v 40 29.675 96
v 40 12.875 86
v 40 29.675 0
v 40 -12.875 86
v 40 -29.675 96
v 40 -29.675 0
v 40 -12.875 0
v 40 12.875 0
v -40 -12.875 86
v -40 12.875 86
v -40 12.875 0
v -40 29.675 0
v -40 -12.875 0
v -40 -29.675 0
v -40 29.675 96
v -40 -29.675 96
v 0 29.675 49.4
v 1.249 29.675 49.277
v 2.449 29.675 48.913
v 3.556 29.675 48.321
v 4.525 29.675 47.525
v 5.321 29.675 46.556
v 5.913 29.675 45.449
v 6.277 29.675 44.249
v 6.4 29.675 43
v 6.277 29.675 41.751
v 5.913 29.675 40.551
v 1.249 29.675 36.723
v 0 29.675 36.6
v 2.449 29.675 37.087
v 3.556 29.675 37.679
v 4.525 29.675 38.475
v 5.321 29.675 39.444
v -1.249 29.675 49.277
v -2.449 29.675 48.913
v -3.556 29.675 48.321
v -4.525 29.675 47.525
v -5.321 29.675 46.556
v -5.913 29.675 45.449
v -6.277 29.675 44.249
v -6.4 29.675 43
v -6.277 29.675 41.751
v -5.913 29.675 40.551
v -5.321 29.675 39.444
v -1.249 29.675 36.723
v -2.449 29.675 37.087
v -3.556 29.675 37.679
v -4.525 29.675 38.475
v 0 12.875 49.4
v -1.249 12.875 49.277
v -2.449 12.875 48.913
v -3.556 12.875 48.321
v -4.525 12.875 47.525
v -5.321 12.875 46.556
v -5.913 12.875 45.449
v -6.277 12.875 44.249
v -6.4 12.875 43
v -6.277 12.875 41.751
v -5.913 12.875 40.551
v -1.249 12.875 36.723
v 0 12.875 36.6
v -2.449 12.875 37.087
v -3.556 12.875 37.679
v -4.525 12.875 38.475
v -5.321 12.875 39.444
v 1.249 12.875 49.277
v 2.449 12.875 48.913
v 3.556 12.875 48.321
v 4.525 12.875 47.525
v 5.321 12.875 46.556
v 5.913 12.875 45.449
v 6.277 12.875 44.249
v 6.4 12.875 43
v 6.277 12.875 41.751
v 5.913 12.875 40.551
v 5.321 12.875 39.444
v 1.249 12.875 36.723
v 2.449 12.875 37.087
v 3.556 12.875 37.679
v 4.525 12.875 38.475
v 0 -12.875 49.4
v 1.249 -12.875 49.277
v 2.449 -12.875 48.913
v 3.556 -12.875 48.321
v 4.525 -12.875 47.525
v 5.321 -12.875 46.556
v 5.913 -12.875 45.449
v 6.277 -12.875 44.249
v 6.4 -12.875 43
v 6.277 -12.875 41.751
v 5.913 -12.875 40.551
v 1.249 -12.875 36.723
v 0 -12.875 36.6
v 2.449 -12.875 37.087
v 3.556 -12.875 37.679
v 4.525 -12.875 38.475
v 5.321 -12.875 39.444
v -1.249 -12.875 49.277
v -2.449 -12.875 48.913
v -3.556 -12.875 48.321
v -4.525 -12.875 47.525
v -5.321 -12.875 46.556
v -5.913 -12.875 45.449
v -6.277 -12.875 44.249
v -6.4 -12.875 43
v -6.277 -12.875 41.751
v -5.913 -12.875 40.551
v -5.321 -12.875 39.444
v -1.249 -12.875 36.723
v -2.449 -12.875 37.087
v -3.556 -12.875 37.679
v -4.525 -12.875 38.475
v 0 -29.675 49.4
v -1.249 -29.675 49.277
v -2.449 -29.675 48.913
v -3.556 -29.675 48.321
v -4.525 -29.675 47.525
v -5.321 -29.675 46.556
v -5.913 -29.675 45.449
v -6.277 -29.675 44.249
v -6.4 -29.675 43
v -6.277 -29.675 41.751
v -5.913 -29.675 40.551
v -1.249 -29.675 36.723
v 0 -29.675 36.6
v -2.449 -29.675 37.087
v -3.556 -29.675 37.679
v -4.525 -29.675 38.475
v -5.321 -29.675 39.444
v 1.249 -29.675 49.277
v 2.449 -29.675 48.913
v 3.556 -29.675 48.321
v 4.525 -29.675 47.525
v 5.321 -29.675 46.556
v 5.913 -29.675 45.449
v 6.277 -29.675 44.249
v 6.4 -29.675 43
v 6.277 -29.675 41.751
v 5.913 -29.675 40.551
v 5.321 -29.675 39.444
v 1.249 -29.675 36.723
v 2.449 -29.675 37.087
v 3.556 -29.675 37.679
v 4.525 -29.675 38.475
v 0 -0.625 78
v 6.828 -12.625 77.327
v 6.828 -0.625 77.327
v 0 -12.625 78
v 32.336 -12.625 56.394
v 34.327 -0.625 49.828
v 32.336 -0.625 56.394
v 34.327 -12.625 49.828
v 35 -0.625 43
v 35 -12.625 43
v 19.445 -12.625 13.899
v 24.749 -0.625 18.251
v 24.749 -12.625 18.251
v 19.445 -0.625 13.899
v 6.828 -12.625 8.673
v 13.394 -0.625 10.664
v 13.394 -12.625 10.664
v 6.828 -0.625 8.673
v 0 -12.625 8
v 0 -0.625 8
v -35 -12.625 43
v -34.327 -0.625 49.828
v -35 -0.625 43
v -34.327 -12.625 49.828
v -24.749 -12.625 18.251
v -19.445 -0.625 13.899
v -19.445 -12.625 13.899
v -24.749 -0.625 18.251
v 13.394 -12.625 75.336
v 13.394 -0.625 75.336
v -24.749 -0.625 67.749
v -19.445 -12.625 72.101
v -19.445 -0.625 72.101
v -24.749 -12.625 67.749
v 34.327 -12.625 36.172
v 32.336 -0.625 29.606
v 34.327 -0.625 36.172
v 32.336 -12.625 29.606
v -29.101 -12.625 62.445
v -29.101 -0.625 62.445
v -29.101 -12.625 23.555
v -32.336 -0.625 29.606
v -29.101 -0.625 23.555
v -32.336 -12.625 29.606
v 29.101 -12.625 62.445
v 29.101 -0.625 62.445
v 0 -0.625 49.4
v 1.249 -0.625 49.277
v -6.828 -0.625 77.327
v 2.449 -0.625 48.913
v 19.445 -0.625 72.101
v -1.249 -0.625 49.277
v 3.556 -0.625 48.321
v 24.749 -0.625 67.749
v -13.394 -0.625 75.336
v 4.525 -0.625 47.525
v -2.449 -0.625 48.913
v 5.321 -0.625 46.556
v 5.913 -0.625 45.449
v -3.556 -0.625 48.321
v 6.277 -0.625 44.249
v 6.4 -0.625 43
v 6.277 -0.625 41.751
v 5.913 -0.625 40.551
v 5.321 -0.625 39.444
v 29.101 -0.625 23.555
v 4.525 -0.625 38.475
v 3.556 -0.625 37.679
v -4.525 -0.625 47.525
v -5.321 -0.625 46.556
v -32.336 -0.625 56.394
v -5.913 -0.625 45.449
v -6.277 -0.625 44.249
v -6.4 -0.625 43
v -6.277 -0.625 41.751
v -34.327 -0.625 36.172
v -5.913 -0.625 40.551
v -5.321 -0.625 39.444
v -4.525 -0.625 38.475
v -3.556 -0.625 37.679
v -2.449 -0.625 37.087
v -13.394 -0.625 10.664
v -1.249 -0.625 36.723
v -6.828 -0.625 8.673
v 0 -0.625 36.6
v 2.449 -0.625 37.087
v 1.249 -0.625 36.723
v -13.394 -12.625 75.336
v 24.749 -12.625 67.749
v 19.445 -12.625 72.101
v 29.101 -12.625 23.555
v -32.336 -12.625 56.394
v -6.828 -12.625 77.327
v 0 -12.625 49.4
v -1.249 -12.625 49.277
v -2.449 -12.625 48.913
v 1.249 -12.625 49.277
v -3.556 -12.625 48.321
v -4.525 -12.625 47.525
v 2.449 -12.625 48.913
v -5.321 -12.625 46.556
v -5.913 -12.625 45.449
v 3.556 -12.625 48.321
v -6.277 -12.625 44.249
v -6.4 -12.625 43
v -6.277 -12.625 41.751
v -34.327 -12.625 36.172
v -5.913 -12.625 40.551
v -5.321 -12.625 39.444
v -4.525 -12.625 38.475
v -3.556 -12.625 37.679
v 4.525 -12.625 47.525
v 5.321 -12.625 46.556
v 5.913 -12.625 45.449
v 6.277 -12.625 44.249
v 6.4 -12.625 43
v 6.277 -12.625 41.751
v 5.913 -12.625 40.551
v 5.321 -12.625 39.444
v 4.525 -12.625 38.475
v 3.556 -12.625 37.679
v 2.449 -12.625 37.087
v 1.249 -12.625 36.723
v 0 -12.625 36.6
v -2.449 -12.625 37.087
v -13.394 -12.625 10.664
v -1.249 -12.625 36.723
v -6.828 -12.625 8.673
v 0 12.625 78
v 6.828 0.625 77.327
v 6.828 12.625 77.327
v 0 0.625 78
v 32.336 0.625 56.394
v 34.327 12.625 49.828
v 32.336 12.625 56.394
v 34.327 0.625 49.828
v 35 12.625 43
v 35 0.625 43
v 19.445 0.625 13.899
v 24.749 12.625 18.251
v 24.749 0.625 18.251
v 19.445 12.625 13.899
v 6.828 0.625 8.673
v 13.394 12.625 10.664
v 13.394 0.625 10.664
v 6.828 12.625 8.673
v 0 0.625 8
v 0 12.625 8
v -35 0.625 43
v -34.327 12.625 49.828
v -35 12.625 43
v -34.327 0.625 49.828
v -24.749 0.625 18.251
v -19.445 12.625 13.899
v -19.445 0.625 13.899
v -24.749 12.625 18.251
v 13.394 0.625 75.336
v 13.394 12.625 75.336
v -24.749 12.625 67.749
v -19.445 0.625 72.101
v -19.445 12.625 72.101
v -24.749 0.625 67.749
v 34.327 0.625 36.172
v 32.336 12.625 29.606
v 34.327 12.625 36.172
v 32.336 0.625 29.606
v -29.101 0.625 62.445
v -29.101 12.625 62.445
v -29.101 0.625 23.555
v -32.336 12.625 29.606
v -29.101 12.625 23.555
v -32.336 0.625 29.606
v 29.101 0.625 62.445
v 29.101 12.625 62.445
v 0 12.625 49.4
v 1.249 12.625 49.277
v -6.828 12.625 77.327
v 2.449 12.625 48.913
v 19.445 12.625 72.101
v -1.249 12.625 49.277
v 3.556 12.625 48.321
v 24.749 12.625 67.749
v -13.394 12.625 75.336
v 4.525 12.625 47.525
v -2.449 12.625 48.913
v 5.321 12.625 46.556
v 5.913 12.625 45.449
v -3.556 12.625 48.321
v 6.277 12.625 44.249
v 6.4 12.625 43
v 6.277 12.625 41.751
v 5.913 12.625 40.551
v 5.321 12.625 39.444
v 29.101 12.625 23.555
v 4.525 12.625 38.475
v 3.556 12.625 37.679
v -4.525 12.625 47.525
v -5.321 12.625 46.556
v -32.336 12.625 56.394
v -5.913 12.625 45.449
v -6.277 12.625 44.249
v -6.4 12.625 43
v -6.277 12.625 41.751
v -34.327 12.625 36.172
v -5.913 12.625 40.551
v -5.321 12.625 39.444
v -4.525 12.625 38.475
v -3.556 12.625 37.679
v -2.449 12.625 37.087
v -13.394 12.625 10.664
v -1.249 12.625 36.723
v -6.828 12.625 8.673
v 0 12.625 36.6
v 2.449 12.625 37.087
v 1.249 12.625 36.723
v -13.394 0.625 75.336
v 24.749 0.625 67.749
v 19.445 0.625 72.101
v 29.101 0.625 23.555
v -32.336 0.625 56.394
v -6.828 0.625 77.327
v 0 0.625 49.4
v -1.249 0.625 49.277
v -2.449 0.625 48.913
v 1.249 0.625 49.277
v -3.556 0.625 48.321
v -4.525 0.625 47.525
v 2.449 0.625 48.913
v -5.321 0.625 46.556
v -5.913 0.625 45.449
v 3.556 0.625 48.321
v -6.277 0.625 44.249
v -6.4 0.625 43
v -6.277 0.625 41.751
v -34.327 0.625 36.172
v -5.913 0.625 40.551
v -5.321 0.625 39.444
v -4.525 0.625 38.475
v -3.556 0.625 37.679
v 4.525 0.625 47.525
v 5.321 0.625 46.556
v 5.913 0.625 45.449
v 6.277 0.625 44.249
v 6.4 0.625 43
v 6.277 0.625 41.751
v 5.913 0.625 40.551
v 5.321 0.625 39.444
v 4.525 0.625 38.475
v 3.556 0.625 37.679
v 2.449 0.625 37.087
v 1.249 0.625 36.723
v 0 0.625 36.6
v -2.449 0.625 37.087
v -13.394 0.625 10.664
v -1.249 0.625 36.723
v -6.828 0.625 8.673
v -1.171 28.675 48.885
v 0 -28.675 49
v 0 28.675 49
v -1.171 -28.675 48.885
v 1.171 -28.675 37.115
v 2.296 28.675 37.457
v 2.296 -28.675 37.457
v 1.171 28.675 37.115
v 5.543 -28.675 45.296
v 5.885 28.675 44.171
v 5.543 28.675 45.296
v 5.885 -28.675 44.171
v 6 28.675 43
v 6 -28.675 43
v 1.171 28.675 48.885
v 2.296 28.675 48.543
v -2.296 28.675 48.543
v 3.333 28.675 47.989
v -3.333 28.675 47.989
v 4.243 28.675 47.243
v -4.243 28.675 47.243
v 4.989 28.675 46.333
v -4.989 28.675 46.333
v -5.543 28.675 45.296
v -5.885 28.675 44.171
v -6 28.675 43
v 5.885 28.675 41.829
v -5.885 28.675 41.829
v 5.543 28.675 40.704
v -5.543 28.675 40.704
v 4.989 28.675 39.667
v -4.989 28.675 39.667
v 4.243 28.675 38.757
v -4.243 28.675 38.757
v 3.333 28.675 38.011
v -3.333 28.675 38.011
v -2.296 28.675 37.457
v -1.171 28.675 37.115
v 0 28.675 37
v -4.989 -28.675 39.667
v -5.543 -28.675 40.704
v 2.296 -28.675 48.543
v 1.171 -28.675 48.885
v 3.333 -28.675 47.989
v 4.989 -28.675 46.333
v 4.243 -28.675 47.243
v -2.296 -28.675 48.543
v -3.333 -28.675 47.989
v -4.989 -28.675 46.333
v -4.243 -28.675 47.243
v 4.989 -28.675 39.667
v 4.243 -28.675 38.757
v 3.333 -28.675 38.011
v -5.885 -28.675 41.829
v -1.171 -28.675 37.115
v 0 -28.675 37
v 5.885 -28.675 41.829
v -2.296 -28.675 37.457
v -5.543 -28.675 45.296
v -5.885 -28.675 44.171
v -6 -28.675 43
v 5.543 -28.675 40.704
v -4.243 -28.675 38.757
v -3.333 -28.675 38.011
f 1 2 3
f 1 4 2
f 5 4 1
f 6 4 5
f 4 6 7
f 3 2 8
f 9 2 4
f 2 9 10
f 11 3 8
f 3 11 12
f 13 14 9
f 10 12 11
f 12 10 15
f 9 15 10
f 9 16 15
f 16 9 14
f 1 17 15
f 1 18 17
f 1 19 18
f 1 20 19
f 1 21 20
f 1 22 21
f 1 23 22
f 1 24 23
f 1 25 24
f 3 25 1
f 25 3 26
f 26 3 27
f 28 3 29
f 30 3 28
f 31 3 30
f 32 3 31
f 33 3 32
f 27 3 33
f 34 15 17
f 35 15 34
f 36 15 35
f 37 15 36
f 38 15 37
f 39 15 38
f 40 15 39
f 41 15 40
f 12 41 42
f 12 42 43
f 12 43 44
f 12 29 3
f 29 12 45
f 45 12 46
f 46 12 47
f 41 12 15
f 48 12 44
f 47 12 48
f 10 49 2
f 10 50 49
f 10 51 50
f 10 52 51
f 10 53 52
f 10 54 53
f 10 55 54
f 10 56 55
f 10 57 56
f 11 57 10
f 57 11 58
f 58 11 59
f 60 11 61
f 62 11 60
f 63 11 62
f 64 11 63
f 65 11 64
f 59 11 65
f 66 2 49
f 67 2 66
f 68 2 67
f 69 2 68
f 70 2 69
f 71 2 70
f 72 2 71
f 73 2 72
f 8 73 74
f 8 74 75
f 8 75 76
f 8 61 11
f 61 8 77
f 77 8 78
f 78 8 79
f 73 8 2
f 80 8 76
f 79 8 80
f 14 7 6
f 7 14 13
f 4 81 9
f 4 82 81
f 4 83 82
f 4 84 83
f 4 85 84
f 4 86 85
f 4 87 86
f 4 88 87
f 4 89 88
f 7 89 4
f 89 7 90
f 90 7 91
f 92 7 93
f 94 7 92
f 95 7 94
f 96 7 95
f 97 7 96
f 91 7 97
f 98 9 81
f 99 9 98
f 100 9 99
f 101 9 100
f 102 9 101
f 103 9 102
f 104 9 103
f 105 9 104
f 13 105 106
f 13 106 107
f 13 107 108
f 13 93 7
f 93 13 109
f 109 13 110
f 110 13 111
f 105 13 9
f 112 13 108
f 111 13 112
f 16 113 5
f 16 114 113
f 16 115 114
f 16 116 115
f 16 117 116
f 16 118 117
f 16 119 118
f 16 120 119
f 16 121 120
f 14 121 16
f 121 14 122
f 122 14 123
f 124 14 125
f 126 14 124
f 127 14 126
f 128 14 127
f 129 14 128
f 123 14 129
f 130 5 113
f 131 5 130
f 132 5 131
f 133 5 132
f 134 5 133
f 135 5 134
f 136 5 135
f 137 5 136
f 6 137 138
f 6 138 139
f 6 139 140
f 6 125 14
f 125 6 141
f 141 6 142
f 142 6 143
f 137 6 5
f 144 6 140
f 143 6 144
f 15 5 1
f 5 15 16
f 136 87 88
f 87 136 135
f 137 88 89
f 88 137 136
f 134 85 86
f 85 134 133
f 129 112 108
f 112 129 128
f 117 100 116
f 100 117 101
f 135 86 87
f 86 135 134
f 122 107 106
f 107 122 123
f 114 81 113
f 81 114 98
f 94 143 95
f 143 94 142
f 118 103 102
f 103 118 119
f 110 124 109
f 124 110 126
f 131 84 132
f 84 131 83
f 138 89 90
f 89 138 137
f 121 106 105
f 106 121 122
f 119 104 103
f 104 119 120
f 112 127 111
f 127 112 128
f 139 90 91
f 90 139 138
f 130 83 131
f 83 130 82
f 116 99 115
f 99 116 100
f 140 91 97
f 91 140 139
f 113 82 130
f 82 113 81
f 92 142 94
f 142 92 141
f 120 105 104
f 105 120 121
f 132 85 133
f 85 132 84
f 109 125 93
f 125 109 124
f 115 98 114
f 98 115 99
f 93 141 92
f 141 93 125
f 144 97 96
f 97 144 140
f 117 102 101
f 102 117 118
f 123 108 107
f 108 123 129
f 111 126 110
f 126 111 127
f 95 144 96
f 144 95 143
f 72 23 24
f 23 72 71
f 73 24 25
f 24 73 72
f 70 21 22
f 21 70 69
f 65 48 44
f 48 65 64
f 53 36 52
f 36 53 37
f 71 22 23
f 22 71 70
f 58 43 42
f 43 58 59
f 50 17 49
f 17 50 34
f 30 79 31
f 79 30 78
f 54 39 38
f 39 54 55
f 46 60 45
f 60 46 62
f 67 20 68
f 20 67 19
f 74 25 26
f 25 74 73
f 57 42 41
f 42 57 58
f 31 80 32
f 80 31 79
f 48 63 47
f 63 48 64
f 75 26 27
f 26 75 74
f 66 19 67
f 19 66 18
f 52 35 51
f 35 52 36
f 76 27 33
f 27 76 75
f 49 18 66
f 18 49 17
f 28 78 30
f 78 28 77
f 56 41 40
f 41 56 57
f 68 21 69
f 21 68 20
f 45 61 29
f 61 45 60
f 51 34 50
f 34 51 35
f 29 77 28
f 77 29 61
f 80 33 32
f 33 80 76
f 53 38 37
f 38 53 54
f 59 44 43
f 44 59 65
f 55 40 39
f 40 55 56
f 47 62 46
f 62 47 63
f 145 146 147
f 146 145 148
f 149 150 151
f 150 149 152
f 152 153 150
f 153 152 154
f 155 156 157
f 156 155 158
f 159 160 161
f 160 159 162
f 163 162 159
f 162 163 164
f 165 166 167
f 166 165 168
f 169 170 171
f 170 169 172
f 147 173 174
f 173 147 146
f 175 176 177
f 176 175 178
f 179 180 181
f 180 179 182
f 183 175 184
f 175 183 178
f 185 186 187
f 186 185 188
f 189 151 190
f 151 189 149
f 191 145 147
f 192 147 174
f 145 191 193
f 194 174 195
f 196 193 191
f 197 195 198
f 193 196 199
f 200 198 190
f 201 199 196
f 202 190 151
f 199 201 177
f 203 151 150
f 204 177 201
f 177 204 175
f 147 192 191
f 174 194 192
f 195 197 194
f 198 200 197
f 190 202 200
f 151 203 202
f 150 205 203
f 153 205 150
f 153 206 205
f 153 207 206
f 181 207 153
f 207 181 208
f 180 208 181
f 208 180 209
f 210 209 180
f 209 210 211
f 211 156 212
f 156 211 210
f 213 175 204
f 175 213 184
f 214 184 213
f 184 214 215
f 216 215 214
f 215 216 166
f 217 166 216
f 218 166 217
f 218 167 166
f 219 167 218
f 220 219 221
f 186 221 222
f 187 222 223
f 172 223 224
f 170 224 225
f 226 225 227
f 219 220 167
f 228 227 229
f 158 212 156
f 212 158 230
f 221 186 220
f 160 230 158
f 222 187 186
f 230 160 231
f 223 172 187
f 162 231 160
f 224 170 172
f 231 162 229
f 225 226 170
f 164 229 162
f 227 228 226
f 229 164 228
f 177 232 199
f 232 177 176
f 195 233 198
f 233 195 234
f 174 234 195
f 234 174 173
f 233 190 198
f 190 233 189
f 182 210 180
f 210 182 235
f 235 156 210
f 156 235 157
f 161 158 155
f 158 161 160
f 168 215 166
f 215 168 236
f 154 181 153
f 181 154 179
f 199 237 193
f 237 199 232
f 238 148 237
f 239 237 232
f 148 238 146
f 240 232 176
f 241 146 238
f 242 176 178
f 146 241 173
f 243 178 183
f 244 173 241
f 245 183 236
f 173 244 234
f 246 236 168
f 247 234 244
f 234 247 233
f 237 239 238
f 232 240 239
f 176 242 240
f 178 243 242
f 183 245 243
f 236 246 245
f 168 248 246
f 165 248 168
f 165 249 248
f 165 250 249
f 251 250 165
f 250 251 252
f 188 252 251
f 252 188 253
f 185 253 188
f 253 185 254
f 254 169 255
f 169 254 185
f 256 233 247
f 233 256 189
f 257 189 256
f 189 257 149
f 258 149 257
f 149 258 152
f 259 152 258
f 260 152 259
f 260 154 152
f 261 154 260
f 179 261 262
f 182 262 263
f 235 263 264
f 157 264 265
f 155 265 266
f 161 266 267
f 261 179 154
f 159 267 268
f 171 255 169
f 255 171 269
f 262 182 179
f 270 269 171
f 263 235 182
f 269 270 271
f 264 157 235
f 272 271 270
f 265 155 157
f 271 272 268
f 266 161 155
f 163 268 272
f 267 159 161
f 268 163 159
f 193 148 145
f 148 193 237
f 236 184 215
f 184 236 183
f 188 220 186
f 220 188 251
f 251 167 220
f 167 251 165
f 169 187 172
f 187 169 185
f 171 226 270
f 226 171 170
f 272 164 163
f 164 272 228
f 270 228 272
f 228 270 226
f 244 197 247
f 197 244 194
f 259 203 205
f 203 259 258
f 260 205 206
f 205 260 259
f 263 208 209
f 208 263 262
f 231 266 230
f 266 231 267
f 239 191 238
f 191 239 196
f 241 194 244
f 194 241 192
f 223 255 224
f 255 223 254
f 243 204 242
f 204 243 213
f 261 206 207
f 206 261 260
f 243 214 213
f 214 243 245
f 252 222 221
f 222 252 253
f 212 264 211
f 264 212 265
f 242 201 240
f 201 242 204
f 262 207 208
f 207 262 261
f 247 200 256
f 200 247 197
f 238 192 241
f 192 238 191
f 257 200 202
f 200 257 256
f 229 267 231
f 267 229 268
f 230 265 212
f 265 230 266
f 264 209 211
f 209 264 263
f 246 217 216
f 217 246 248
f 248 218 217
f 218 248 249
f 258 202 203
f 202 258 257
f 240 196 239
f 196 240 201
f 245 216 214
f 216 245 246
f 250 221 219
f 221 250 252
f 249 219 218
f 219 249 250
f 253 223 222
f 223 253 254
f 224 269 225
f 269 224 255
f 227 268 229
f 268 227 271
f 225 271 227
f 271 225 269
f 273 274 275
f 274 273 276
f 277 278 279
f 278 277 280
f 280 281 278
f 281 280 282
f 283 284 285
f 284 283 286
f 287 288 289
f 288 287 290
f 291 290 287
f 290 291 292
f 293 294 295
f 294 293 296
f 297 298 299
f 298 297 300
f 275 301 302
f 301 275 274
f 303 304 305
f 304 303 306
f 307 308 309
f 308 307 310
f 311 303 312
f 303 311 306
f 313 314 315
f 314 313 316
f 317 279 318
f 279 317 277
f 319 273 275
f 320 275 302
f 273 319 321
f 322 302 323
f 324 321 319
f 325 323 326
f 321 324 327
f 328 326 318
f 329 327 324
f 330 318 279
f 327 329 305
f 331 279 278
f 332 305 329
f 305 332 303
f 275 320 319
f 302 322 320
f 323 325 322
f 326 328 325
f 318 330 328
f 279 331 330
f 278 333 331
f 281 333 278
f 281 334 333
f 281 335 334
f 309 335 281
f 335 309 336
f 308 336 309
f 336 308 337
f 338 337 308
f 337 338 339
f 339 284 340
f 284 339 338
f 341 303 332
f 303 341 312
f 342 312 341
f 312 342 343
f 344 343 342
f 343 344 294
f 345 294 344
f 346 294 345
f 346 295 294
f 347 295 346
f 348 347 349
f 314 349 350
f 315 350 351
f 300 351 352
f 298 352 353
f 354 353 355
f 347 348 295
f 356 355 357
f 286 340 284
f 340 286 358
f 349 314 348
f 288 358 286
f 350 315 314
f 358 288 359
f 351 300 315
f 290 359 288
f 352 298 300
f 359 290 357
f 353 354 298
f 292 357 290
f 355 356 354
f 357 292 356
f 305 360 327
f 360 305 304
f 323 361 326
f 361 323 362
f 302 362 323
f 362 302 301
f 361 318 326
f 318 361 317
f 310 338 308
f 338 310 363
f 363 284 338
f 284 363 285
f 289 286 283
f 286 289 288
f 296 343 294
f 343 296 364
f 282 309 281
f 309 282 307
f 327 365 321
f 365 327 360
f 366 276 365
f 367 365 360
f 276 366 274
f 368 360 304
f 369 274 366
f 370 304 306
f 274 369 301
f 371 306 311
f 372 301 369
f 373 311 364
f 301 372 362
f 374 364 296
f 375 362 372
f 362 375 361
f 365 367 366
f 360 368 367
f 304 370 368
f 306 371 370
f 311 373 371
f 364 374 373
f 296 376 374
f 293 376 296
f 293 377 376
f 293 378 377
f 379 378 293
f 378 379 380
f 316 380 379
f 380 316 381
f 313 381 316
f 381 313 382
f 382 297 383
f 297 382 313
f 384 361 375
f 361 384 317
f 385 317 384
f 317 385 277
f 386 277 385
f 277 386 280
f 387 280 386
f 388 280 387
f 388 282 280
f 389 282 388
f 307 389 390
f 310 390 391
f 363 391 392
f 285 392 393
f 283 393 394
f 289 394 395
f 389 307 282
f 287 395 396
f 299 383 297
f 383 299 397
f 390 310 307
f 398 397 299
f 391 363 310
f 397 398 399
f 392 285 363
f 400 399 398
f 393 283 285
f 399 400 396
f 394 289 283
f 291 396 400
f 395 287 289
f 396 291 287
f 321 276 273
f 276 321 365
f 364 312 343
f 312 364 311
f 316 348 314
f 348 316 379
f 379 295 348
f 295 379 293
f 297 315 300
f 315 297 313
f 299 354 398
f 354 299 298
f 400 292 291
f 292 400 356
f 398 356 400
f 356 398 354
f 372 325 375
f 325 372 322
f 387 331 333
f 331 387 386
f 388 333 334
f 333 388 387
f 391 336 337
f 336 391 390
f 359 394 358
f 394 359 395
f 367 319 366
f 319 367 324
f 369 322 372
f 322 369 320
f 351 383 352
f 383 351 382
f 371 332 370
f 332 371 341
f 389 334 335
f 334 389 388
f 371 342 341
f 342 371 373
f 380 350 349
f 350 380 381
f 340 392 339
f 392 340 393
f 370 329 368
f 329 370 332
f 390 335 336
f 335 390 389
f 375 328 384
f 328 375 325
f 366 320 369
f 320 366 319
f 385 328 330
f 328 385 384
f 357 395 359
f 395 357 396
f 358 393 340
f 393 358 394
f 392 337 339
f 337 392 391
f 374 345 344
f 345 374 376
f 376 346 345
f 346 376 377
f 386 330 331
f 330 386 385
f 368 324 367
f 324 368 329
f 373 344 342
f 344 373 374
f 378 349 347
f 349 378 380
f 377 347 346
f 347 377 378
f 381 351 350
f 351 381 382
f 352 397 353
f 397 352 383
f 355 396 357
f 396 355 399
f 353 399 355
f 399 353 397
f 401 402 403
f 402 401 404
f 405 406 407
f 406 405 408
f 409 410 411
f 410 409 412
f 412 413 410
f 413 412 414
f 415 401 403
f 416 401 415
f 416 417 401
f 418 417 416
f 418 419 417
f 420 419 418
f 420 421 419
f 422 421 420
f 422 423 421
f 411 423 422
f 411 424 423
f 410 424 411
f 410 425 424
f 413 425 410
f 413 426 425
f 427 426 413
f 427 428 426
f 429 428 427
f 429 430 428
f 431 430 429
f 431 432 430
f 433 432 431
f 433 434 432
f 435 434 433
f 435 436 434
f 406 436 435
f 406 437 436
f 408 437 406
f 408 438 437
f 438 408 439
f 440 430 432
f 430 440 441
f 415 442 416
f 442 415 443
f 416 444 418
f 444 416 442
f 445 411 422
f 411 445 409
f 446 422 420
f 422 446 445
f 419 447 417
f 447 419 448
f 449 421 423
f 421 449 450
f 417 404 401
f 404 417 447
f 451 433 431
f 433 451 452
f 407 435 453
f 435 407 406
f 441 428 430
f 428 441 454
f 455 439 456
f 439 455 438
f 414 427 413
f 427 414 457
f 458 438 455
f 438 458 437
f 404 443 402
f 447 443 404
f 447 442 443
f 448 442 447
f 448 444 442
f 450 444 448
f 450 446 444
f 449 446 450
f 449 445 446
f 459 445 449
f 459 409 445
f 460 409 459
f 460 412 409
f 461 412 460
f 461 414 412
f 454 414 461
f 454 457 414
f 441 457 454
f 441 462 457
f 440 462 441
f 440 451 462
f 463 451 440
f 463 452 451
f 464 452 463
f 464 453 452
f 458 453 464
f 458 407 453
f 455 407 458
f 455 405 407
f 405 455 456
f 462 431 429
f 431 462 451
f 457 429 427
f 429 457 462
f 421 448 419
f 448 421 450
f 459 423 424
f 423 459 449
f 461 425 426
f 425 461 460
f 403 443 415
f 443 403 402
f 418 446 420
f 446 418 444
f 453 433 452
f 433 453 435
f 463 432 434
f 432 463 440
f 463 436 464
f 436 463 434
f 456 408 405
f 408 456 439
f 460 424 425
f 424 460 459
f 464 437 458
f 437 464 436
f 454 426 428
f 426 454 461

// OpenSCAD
$fn = 32;

// ------------------------------------------------------------------------
// Trolley wheel set: wheels d70, fork 86 mm tall
// Every part is its own module, assembly() places every instance.
// ------------------------------------------------------------------------

// --- part 1 ---
module trolley_fork() {
  difference() {
    union() {
      translate([-40, 12.875, 0]) cube([80, 16.8, 86]);
      translate([-40, -29.675, 0]) cube([80, 16.8, 86]);
      translate([-40, -29.675, 86]) cube([80, 59.35, 10]);
    }
    translate([0, -21.275, 43]) rotate([90, 0, 0]) cylinder(h = 18.8, d = 12.8, center = true);
    translate([0, 21.275, 43]) rotate([90, 0, 0]) cylinder(h = 18.8, d = 12.8, center = true);
  }
}

// --- part 2 ---
module trolley_wheel() {
  difference() {
      translate([0, 0, 0]) cylinder(h = 12, d = 70);
      translate([0, 0, -1]) cylinder(h = 14, d = 12.8);
    }
}

// --- part 3 ---
module trolley_axle() {
  translate([0, 0, -28.675]) cylinder(h = 57.35, d = 12);
}

// --- assembly ---
module assembly() {
  color([0.80, 0.24, 0.20]) translate([0, 0, 0]) rotate([0, 0, 0]) trolley_fork();
  color([0.20, 0.45, 0.75]) translate([0, -0.625, 43]) rotate([90, 0, 0]) trolley_wheel();
  color([0.25, 0.62, 0.32]) translate([0, 12.625, 43]) rotate([90, 0, 0]) trolley_wheel();
  color([0.92, 0.70, 0.18]) translate([0, 0, 43]) rotate([90, 0, 0]) trolley_axle();
}

assembly();
